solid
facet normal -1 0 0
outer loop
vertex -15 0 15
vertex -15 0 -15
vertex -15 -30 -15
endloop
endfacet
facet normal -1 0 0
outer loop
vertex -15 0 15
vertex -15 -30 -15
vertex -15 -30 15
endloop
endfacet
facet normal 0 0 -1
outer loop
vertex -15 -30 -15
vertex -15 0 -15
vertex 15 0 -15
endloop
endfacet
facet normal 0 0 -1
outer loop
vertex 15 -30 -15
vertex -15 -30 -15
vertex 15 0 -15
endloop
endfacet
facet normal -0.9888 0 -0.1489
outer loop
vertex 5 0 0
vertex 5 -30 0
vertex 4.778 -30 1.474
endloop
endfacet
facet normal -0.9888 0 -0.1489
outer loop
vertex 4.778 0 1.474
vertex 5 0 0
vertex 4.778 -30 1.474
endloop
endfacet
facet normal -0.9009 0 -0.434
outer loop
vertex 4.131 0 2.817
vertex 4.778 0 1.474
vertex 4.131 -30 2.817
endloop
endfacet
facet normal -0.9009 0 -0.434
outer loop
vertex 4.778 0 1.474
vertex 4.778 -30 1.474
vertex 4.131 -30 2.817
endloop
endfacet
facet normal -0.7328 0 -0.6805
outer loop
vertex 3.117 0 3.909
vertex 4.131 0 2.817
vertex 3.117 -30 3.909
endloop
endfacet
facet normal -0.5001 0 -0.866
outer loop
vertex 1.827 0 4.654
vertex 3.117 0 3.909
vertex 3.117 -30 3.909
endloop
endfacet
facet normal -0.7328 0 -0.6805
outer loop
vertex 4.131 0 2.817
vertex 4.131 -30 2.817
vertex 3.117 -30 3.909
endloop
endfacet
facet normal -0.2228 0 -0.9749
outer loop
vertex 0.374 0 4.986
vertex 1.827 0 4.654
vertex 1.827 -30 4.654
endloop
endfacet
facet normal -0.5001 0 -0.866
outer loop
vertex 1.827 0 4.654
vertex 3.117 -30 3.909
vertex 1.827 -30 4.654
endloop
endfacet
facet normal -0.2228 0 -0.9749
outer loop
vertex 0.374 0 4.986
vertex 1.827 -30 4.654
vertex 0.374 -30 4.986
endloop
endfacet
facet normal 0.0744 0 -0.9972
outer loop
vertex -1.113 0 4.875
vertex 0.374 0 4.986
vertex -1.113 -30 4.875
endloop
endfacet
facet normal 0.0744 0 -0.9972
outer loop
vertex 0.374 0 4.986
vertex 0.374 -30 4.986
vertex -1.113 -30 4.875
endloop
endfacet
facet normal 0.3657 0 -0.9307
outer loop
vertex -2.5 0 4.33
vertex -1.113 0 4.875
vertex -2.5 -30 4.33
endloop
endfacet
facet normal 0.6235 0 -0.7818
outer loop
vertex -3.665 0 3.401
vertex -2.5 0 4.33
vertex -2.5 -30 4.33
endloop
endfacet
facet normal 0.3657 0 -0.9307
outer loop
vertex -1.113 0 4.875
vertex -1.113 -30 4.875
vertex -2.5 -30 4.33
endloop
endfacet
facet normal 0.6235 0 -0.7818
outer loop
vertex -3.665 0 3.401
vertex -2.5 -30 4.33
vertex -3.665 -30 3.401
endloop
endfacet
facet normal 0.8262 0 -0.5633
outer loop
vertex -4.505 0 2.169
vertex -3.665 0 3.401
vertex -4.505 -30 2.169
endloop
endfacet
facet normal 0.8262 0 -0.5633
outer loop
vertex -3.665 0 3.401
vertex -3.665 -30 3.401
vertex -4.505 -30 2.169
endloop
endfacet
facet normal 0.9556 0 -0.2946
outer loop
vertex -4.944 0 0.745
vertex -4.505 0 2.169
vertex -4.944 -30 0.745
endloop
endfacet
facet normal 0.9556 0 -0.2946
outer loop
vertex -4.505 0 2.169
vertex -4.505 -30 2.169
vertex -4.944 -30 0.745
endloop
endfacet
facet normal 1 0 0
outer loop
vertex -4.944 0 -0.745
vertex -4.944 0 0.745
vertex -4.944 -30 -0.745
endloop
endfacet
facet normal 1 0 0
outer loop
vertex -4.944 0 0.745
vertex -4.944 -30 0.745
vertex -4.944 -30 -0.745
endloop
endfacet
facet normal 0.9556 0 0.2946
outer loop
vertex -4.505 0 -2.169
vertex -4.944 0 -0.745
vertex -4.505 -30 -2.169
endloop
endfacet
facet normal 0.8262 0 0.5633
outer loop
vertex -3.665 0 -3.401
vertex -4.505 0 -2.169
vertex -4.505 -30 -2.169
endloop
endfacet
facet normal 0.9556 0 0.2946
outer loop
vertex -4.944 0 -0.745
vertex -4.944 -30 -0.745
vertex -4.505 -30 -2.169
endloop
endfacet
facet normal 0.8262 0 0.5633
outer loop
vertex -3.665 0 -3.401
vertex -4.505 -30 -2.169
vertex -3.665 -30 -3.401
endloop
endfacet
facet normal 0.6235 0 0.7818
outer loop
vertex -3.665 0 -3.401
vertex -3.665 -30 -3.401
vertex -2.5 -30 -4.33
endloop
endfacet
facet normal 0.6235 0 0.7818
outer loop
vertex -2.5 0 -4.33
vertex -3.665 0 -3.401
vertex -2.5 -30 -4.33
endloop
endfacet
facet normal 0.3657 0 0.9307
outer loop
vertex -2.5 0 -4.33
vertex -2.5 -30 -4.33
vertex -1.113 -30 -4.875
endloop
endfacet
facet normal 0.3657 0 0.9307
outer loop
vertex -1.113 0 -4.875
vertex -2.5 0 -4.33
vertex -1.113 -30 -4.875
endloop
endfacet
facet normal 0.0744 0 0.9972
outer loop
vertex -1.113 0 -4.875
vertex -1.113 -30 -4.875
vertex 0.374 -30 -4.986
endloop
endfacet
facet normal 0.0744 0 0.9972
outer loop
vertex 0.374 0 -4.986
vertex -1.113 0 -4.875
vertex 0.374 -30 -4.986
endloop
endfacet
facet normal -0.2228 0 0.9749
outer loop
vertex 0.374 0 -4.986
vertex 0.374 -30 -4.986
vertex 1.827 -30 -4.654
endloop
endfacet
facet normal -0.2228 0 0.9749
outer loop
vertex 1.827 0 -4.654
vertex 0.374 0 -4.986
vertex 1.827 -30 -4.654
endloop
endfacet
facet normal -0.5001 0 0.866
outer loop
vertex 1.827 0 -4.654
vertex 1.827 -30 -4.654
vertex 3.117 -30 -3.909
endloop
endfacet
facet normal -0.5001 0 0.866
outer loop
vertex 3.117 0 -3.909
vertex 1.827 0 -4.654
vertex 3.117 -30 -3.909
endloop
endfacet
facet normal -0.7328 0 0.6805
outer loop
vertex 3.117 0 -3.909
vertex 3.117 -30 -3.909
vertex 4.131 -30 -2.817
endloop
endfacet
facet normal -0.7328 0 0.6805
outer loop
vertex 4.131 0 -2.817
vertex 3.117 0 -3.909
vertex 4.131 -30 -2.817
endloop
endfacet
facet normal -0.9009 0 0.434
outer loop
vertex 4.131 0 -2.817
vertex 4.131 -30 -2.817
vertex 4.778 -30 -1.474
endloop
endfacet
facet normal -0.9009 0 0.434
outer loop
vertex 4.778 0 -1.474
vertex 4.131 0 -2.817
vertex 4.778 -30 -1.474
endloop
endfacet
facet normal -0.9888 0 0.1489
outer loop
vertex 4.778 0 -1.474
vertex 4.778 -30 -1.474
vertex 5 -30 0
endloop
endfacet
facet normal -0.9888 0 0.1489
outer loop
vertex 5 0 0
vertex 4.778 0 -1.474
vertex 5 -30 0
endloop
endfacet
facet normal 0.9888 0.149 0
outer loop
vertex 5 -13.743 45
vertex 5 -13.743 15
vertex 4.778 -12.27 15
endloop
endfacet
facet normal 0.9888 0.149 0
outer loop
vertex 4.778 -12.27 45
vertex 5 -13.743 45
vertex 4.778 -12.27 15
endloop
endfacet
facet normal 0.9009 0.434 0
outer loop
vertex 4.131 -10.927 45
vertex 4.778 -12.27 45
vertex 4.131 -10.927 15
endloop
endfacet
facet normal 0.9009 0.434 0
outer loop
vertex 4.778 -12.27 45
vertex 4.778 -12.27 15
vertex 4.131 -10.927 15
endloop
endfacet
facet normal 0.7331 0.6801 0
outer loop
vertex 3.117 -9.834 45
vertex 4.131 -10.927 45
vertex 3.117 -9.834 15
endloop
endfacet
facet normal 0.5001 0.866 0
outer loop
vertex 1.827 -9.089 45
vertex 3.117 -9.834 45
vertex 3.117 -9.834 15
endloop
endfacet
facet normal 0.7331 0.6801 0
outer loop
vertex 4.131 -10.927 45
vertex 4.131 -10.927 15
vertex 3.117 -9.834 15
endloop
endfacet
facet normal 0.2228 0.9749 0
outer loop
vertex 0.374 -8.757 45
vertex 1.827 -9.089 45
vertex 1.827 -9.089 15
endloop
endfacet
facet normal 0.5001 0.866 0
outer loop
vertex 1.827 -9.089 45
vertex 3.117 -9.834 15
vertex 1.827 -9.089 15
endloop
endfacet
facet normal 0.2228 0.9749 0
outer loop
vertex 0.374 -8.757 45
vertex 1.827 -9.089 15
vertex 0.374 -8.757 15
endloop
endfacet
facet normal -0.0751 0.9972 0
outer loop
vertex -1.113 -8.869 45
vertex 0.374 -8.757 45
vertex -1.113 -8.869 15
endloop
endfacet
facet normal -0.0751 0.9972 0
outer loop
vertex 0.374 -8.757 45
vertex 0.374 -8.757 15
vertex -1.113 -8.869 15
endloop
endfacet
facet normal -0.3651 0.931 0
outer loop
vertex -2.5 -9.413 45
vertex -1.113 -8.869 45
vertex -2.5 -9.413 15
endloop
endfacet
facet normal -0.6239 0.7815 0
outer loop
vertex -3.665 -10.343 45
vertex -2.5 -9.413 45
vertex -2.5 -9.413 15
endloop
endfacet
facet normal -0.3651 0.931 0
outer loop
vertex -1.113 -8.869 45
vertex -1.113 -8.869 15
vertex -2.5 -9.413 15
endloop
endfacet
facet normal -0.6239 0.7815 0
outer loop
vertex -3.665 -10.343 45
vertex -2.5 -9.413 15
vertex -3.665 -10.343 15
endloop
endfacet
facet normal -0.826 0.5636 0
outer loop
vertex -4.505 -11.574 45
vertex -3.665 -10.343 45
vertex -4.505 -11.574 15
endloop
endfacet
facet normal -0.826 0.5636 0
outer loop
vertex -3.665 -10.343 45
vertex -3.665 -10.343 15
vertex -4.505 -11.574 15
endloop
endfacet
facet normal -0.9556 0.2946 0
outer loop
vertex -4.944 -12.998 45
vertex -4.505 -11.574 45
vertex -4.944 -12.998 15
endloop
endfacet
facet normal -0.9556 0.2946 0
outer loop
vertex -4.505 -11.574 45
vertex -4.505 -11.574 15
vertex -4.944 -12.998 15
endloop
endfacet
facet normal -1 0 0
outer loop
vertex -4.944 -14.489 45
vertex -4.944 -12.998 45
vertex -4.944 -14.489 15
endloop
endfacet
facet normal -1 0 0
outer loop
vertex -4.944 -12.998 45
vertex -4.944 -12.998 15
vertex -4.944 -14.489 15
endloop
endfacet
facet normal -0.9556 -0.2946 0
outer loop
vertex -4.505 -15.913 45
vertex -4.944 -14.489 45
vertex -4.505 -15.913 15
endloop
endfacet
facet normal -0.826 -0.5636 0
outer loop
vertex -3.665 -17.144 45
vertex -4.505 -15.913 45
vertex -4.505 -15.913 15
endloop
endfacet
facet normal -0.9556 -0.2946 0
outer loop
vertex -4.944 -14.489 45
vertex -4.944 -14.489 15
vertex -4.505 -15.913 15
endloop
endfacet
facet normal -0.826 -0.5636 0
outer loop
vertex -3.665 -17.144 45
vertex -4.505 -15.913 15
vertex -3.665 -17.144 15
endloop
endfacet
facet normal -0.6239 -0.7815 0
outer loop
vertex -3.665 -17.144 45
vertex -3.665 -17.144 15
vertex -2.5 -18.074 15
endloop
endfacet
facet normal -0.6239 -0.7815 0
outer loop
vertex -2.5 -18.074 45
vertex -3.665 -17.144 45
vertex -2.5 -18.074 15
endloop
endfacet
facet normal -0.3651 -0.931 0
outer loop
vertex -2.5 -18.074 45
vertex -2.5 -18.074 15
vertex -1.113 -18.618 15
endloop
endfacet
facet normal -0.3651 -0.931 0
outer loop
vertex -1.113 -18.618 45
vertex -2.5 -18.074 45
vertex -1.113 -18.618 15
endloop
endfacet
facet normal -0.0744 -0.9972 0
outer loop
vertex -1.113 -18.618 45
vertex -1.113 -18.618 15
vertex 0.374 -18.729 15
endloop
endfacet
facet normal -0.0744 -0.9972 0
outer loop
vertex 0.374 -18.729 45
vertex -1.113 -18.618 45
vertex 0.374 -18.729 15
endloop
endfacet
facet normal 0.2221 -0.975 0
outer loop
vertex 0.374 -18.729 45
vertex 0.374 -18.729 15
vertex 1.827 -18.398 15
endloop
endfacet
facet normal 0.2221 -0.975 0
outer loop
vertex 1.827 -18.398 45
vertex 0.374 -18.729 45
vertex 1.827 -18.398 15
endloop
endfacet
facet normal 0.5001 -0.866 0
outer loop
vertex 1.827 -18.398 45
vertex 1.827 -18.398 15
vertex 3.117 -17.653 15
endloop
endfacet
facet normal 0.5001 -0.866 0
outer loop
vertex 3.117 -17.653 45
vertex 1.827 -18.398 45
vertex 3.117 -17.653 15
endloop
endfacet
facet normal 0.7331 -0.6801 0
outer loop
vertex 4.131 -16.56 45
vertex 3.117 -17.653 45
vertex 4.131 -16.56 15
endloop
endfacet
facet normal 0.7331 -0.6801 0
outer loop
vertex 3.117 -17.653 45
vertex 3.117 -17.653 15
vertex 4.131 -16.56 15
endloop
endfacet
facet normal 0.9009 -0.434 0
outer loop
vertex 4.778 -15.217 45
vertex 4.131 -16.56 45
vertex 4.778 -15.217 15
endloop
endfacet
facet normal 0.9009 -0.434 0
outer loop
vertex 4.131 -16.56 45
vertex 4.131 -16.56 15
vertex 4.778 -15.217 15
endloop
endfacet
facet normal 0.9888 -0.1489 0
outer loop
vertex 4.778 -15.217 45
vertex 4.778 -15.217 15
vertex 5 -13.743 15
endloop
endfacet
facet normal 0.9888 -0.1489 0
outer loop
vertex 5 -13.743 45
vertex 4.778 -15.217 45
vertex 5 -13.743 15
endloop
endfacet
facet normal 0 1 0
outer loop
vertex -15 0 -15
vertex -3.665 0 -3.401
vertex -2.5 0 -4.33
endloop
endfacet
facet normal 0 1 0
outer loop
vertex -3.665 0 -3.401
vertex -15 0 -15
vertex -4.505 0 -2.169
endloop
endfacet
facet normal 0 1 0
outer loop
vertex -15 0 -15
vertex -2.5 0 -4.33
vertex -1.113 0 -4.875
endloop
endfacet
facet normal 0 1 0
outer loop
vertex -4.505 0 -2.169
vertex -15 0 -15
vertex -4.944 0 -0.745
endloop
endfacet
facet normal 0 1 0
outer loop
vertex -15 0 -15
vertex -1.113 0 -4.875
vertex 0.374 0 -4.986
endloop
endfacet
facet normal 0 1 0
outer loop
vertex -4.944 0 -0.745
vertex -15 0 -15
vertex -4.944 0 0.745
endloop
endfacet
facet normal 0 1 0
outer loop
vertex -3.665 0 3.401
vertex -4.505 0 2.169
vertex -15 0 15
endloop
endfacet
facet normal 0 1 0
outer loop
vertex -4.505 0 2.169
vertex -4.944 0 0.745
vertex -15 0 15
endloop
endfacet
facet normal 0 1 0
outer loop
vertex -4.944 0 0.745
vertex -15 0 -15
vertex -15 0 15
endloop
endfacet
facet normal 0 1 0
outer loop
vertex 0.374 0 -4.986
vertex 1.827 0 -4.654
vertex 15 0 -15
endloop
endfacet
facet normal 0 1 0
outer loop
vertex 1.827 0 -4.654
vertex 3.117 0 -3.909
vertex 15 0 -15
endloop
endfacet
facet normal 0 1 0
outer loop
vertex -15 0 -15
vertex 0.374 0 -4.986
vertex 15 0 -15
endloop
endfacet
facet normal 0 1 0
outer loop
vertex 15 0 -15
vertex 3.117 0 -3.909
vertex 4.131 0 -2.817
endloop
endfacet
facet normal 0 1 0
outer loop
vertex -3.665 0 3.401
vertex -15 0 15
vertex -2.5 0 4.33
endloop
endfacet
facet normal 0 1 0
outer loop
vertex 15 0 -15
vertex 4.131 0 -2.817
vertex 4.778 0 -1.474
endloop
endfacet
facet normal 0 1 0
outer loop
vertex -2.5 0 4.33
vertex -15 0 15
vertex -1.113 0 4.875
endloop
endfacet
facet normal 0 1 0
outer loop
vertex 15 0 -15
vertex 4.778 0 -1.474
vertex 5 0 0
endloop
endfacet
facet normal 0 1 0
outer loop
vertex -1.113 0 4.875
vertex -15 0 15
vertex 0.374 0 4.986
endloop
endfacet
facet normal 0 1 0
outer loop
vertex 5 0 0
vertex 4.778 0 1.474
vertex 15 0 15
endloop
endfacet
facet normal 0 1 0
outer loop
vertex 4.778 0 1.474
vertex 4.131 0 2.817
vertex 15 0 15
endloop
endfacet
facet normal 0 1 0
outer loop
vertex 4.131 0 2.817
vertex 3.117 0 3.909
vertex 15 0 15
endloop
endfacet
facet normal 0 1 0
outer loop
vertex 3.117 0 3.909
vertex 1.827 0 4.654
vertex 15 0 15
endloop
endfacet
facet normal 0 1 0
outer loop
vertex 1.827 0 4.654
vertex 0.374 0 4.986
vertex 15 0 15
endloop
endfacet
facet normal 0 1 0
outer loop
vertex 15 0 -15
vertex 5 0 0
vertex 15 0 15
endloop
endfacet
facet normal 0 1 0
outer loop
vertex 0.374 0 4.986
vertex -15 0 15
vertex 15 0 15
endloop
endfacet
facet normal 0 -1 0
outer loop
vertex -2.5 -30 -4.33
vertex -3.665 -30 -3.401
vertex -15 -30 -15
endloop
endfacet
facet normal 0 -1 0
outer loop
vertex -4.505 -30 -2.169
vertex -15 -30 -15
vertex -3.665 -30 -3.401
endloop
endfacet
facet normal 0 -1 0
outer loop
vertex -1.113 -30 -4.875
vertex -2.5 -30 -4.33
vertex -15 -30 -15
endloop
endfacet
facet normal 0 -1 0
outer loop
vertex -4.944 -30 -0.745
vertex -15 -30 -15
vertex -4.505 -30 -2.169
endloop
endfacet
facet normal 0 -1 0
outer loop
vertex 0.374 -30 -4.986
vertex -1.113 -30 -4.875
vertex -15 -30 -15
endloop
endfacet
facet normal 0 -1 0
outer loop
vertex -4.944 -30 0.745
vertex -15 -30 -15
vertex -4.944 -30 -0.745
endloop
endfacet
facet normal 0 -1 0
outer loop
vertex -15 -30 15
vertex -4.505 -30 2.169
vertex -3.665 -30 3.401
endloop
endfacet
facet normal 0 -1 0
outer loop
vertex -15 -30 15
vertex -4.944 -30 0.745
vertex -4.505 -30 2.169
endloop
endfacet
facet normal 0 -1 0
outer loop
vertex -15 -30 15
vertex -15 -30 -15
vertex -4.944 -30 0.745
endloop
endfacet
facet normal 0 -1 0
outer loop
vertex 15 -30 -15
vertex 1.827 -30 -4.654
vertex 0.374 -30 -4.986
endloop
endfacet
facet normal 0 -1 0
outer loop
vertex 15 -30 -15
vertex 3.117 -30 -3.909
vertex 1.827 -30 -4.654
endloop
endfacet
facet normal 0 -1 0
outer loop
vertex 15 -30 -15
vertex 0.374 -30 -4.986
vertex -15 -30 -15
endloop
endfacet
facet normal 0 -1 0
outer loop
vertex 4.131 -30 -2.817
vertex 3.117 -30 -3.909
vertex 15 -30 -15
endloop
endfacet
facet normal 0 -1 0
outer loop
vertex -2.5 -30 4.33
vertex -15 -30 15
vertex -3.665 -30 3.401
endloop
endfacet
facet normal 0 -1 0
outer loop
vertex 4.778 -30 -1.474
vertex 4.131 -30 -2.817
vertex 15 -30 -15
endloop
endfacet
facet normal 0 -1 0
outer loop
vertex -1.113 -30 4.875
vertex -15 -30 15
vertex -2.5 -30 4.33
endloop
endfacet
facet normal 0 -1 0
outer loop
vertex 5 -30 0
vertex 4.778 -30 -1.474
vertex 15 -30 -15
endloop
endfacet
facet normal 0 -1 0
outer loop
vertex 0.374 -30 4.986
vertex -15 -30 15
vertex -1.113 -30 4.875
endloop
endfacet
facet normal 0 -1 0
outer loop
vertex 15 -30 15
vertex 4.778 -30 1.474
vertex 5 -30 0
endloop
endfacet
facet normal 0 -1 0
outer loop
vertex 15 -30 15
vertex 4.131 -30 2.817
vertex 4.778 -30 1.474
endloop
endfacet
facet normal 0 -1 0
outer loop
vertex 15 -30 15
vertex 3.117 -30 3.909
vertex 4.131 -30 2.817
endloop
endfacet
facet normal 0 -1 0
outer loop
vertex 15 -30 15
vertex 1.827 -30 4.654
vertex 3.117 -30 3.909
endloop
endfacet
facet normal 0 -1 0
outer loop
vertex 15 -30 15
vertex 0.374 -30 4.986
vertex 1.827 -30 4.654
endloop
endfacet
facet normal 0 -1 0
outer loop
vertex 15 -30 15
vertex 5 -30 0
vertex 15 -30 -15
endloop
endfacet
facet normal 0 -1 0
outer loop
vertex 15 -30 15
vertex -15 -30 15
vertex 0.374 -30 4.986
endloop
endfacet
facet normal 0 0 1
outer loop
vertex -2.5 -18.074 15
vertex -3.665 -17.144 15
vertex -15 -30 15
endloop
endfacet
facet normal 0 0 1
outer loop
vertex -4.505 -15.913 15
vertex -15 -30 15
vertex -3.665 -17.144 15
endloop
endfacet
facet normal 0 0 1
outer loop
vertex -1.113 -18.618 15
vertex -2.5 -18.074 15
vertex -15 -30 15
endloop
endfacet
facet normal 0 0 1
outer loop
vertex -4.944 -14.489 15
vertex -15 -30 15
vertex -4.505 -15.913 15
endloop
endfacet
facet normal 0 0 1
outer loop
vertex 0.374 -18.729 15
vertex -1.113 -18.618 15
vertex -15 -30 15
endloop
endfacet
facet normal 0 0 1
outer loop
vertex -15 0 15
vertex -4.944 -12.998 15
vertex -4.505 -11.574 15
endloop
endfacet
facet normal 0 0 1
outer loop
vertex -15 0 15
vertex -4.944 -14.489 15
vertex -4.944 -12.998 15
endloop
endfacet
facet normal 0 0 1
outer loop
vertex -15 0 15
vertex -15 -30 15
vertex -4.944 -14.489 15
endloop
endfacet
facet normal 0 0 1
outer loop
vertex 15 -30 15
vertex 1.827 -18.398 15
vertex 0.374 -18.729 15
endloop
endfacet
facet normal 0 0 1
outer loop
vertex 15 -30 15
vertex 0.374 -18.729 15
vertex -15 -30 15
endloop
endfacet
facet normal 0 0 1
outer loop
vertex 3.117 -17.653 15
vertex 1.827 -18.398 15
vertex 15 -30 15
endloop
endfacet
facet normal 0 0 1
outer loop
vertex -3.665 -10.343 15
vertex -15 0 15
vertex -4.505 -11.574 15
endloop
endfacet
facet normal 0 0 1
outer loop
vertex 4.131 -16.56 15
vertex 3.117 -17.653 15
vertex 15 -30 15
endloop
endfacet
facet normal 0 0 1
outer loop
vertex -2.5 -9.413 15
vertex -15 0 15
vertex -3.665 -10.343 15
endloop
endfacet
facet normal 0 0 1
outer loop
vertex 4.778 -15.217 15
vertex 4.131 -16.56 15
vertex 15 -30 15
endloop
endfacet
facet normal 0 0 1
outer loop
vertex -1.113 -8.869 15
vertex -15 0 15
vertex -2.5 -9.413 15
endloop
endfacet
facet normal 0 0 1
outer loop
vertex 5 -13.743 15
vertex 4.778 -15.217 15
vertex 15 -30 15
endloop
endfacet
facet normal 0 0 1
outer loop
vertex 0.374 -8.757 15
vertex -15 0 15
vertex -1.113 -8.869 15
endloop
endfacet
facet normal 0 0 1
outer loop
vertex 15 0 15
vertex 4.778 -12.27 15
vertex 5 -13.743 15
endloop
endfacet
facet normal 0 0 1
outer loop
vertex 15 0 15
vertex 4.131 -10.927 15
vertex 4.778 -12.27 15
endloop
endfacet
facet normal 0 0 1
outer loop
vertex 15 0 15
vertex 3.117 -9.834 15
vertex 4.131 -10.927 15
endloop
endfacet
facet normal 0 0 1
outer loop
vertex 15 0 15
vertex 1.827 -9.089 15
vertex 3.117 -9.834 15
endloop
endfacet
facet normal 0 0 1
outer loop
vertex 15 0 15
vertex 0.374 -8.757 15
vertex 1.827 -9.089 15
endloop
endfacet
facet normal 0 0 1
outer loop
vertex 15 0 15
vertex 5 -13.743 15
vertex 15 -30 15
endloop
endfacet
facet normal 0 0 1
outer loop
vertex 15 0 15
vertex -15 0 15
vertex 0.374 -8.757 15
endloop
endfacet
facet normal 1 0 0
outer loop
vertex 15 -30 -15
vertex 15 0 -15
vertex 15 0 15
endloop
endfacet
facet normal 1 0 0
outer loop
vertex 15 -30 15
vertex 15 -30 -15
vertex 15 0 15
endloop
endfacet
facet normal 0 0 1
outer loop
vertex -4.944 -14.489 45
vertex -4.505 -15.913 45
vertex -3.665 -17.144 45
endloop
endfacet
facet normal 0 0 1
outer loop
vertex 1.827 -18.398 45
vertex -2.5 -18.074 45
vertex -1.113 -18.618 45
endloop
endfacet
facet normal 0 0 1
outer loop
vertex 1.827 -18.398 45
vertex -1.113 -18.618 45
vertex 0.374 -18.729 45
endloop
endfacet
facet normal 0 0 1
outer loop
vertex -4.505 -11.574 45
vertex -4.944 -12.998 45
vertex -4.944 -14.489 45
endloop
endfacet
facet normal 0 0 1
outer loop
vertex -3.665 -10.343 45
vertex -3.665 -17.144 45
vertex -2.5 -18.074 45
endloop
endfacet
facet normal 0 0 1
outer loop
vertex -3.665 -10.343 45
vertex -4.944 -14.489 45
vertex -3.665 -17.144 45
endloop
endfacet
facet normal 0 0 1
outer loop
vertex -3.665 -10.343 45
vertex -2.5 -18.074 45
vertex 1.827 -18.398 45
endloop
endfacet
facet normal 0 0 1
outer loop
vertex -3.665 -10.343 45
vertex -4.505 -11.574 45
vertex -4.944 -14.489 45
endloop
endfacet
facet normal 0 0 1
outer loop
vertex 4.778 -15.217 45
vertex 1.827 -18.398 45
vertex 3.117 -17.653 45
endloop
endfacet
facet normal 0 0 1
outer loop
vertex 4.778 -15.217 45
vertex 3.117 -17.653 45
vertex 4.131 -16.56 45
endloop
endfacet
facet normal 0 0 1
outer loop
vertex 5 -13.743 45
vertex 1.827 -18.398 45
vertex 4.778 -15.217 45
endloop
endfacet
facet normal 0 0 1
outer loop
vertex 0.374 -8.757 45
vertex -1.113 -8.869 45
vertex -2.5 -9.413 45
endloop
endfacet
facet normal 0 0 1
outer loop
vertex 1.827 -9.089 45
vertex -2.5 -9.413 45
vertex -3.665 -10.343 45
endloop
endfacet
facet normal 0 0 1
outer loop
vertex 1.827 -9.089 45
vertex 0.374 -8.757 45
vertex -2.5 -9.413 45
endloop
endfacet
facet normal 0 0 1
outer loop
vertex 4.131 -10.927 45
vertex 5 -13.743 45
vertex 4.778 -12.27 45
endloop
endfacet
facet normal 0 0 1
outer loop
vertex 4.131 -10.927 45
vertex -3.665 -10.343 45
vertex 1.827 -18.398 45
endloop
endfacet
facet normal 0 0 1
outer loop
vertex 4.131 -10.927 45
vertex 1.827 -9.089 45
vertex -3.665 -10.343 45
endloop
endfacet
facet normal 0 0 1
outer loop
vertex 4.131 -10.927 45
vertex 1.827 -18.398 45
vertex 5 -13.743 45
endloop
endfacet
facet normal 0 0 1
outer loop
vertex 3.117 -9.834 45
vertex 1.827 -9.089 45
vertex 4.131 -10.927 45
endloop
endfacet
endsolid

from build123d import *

# Parameters (mm, degrees)
F0_W     = 30
F0_H     = 30
F1_DEPTH = 30
F3_R     = 5
F4_DEPTH = 30.2
F5_R     = 5
F6_DEPTH = 30


with BuildPart() as f1:
    # F0 (on Front) → F1 (new body)
    with BuildSketch(Plane.XZ):
        Rectangle(F0_W, F0_H)
    extrude(amount=F1_DEPTH)

    # F3 (on face) → F4 (cut)
    with BuildSketch(Plane.XZ.offset(30)):
        Circle(F3_R)
    extrude(amount=-F4_DEPTH, mode=Mode.SUBTRACT)

    # F5 (on face) → F6 (join)
    with BuildSketch(Plane.XY.offset(15)):
        with Locations((0, -13.743456)):
            Circle(F5_R)
    extrude(amount=F6_DEPTH)


solid = f1.part
